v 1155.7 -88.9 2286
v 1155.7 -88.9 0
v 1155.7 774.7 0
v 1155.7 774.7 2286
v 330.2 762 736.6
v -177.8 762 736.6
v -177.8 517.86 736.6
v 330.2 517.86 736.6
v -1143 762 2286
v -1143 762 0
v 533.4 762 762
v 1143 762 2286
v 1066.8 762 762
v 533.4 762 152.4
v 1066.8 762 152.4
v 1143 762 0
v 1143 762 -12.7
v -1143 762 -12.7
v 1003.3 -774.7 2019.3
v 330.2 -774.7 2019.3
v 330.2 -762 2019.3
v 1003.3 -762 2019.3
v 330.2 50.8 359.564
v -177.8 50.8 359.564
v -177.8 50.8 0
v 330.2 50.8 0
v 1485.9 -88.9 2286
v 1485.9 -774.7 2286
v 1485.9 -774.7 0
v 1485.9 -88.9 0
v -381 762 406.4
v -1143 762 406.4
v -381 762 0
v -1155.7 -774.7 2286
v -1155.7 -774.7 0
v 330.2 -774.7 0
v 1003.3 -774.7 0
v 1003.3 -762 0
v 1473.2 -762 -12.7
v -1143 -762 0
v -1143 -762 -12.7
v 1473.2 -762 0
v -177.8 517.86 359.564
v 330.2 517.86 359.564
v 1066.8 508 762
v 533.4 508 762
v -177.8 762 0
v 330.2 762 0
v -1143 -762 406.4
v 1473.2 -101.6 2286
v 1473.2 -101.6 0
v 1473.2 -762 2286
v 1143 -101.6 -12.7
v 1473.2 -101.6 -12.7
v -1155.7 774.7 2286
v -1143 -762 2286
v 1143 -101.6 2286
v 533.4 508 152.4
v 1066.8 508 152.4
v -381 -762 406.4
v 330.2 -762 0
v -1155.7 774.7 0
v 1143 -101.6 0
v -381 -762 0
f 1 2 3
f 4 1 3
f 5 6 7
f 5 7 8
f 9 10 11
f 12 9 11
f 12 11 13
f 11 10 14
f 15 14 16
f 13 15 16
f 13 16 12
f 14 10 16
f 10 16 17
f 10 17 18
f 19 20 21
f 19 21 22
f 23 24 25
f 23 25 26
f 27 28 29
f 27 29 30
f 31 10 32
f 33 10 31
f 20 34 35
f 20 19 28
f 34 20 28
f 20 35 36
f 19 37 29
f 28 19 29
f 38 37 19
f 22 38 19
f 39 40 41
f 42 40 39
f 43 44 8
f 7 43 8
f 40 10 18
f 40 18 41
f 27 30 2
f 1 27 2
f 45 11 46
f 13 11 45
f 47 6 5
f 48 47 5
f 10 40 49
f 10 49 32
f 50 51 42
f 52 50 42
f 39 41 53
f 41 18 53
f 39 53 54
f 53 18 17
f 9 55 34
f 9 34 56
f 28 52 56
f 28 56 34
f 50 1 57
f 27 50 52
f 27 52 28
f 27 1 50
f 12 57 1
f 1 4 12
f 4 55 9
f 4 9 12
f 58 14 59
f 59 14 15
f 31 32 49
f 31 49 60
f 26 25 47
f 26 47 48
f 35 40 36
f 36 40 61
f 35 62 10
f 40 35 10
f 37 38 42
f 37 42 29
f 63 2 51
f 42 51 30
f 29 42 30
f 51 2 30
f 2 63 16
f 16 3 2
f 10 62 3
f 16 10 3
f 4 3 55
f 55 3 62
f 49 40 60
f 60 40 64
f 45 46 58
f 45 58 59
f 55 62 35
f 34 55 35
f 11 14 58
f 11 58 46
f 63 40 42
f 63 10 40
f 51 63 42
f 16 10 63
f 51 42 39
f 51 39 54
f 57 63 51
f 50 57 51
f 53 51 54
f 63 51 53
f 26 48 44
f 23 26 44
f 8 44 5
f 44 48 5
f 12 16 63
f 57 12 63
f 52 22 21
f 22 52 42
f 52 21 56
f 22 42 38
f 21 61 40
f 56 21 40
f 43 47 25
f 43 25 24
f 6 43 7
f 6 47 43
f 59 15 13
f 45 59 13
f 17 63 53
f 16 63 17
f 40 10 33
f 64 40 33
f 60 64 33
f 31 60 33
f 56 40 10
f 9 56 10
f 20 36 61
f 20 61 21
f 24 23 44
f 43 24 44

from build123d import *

# Parameters (mm, degrees)
F1_DEPTH  = 12.7
F3_DEPTH  = 2286
F4_W      = 673.1
F4_H      = 2019.3
F5_DEPTH  = 25.4
F6_W      = 762
F6_H      = 1524
F8_DEPTH  = 406.4
F9_W      = 508
F9_H      = 736.6
F10_DEPTH = 711.2
F9_W_2    = 533.4
F9_H_2    = 609.6
F11_DEPTH = 254
F12_W     = 467.0596377373
F12_H     = 377.0357254505
F13_DEPTH = 762


with BuildPart() as f1:
    # F0 (on Top) → F1 (new body)
    with BuildSketch(Plane.XY):
        Polygon((-1143, -762), (1143, -762), (1473.2, -762), (1473.2, -101.6), (1143, -101.6), (1143, 762), (-1143, 762), align=None)
    extrude(amount=-F1_DEPTH)


with BuildPart() as f3:
    # F2 (on face) → F3 (new body)
    with BuildSketch(Plane.XY):
        Polygon((-1155.7, -774.7), (1485.9, -774.7), (1485.9, -88.9), (1155.7, -88.9), (1155.7, 774.7), (-1155.7, 774.7), align=None)
        Polygon((1473.2, -762), (-1143, -762), (-1143, 762), (1143, 762), (1143, -101.6), (1473.2, -101.6), align=None, mode=Mode.SUBTRACT)
    extrude(amount=F3_DEPTH)

    # F4 (on face) → F5 (cut)
    with BuildSketch(Plane.XZ.offset(774.7)):
        with Locations((666.75, 1009.65)):
            Rectangle(F4_W, F4_H)
    extrude(amount=-F5_DEPTH, mode=Mode.SUBTRACT)

    # F9 (on face) → F11 (join)
    with BuildSketch(Plane.XZ.offset(-762)):
        with Locations((800.1, 457.2)):
            Rectangle(F9_W_2, F9_H_2)
    extrude(amount=F11_DEPTH)


with BuildPart() as f8:
    # F6 (on face) → F8 (new body)
    with BuildSketch(Plane.XY):
        with Locations((-762, 0)):
            Rectangle(F6_W, F6_H)
    extrude(amount=F8_DEPTH)


with BuildPart() as f10:
    # F9 (on face) → F10 (new body)
    with BuildSketch(Plane.XZ.offset(-762)):
        with Locations((76.2, 368.3)):
            Rectangle(F9_W, F9_H)
    extrude(amount=F10_DEPTH)

    # F12 (on face) → F13 (cut)
    with BuildSketch(Plane.YZ.offset(330.2)):
        with Locations((284.3298188686, 548.0821372747)):
            Rectangle(F12_W, F12_H)
    extrude(amount=-F13_DEPTH, mode=Mode.SUBTRACT)


solid = Compound([f1.part, f3.part, f8.part, f10.part])
